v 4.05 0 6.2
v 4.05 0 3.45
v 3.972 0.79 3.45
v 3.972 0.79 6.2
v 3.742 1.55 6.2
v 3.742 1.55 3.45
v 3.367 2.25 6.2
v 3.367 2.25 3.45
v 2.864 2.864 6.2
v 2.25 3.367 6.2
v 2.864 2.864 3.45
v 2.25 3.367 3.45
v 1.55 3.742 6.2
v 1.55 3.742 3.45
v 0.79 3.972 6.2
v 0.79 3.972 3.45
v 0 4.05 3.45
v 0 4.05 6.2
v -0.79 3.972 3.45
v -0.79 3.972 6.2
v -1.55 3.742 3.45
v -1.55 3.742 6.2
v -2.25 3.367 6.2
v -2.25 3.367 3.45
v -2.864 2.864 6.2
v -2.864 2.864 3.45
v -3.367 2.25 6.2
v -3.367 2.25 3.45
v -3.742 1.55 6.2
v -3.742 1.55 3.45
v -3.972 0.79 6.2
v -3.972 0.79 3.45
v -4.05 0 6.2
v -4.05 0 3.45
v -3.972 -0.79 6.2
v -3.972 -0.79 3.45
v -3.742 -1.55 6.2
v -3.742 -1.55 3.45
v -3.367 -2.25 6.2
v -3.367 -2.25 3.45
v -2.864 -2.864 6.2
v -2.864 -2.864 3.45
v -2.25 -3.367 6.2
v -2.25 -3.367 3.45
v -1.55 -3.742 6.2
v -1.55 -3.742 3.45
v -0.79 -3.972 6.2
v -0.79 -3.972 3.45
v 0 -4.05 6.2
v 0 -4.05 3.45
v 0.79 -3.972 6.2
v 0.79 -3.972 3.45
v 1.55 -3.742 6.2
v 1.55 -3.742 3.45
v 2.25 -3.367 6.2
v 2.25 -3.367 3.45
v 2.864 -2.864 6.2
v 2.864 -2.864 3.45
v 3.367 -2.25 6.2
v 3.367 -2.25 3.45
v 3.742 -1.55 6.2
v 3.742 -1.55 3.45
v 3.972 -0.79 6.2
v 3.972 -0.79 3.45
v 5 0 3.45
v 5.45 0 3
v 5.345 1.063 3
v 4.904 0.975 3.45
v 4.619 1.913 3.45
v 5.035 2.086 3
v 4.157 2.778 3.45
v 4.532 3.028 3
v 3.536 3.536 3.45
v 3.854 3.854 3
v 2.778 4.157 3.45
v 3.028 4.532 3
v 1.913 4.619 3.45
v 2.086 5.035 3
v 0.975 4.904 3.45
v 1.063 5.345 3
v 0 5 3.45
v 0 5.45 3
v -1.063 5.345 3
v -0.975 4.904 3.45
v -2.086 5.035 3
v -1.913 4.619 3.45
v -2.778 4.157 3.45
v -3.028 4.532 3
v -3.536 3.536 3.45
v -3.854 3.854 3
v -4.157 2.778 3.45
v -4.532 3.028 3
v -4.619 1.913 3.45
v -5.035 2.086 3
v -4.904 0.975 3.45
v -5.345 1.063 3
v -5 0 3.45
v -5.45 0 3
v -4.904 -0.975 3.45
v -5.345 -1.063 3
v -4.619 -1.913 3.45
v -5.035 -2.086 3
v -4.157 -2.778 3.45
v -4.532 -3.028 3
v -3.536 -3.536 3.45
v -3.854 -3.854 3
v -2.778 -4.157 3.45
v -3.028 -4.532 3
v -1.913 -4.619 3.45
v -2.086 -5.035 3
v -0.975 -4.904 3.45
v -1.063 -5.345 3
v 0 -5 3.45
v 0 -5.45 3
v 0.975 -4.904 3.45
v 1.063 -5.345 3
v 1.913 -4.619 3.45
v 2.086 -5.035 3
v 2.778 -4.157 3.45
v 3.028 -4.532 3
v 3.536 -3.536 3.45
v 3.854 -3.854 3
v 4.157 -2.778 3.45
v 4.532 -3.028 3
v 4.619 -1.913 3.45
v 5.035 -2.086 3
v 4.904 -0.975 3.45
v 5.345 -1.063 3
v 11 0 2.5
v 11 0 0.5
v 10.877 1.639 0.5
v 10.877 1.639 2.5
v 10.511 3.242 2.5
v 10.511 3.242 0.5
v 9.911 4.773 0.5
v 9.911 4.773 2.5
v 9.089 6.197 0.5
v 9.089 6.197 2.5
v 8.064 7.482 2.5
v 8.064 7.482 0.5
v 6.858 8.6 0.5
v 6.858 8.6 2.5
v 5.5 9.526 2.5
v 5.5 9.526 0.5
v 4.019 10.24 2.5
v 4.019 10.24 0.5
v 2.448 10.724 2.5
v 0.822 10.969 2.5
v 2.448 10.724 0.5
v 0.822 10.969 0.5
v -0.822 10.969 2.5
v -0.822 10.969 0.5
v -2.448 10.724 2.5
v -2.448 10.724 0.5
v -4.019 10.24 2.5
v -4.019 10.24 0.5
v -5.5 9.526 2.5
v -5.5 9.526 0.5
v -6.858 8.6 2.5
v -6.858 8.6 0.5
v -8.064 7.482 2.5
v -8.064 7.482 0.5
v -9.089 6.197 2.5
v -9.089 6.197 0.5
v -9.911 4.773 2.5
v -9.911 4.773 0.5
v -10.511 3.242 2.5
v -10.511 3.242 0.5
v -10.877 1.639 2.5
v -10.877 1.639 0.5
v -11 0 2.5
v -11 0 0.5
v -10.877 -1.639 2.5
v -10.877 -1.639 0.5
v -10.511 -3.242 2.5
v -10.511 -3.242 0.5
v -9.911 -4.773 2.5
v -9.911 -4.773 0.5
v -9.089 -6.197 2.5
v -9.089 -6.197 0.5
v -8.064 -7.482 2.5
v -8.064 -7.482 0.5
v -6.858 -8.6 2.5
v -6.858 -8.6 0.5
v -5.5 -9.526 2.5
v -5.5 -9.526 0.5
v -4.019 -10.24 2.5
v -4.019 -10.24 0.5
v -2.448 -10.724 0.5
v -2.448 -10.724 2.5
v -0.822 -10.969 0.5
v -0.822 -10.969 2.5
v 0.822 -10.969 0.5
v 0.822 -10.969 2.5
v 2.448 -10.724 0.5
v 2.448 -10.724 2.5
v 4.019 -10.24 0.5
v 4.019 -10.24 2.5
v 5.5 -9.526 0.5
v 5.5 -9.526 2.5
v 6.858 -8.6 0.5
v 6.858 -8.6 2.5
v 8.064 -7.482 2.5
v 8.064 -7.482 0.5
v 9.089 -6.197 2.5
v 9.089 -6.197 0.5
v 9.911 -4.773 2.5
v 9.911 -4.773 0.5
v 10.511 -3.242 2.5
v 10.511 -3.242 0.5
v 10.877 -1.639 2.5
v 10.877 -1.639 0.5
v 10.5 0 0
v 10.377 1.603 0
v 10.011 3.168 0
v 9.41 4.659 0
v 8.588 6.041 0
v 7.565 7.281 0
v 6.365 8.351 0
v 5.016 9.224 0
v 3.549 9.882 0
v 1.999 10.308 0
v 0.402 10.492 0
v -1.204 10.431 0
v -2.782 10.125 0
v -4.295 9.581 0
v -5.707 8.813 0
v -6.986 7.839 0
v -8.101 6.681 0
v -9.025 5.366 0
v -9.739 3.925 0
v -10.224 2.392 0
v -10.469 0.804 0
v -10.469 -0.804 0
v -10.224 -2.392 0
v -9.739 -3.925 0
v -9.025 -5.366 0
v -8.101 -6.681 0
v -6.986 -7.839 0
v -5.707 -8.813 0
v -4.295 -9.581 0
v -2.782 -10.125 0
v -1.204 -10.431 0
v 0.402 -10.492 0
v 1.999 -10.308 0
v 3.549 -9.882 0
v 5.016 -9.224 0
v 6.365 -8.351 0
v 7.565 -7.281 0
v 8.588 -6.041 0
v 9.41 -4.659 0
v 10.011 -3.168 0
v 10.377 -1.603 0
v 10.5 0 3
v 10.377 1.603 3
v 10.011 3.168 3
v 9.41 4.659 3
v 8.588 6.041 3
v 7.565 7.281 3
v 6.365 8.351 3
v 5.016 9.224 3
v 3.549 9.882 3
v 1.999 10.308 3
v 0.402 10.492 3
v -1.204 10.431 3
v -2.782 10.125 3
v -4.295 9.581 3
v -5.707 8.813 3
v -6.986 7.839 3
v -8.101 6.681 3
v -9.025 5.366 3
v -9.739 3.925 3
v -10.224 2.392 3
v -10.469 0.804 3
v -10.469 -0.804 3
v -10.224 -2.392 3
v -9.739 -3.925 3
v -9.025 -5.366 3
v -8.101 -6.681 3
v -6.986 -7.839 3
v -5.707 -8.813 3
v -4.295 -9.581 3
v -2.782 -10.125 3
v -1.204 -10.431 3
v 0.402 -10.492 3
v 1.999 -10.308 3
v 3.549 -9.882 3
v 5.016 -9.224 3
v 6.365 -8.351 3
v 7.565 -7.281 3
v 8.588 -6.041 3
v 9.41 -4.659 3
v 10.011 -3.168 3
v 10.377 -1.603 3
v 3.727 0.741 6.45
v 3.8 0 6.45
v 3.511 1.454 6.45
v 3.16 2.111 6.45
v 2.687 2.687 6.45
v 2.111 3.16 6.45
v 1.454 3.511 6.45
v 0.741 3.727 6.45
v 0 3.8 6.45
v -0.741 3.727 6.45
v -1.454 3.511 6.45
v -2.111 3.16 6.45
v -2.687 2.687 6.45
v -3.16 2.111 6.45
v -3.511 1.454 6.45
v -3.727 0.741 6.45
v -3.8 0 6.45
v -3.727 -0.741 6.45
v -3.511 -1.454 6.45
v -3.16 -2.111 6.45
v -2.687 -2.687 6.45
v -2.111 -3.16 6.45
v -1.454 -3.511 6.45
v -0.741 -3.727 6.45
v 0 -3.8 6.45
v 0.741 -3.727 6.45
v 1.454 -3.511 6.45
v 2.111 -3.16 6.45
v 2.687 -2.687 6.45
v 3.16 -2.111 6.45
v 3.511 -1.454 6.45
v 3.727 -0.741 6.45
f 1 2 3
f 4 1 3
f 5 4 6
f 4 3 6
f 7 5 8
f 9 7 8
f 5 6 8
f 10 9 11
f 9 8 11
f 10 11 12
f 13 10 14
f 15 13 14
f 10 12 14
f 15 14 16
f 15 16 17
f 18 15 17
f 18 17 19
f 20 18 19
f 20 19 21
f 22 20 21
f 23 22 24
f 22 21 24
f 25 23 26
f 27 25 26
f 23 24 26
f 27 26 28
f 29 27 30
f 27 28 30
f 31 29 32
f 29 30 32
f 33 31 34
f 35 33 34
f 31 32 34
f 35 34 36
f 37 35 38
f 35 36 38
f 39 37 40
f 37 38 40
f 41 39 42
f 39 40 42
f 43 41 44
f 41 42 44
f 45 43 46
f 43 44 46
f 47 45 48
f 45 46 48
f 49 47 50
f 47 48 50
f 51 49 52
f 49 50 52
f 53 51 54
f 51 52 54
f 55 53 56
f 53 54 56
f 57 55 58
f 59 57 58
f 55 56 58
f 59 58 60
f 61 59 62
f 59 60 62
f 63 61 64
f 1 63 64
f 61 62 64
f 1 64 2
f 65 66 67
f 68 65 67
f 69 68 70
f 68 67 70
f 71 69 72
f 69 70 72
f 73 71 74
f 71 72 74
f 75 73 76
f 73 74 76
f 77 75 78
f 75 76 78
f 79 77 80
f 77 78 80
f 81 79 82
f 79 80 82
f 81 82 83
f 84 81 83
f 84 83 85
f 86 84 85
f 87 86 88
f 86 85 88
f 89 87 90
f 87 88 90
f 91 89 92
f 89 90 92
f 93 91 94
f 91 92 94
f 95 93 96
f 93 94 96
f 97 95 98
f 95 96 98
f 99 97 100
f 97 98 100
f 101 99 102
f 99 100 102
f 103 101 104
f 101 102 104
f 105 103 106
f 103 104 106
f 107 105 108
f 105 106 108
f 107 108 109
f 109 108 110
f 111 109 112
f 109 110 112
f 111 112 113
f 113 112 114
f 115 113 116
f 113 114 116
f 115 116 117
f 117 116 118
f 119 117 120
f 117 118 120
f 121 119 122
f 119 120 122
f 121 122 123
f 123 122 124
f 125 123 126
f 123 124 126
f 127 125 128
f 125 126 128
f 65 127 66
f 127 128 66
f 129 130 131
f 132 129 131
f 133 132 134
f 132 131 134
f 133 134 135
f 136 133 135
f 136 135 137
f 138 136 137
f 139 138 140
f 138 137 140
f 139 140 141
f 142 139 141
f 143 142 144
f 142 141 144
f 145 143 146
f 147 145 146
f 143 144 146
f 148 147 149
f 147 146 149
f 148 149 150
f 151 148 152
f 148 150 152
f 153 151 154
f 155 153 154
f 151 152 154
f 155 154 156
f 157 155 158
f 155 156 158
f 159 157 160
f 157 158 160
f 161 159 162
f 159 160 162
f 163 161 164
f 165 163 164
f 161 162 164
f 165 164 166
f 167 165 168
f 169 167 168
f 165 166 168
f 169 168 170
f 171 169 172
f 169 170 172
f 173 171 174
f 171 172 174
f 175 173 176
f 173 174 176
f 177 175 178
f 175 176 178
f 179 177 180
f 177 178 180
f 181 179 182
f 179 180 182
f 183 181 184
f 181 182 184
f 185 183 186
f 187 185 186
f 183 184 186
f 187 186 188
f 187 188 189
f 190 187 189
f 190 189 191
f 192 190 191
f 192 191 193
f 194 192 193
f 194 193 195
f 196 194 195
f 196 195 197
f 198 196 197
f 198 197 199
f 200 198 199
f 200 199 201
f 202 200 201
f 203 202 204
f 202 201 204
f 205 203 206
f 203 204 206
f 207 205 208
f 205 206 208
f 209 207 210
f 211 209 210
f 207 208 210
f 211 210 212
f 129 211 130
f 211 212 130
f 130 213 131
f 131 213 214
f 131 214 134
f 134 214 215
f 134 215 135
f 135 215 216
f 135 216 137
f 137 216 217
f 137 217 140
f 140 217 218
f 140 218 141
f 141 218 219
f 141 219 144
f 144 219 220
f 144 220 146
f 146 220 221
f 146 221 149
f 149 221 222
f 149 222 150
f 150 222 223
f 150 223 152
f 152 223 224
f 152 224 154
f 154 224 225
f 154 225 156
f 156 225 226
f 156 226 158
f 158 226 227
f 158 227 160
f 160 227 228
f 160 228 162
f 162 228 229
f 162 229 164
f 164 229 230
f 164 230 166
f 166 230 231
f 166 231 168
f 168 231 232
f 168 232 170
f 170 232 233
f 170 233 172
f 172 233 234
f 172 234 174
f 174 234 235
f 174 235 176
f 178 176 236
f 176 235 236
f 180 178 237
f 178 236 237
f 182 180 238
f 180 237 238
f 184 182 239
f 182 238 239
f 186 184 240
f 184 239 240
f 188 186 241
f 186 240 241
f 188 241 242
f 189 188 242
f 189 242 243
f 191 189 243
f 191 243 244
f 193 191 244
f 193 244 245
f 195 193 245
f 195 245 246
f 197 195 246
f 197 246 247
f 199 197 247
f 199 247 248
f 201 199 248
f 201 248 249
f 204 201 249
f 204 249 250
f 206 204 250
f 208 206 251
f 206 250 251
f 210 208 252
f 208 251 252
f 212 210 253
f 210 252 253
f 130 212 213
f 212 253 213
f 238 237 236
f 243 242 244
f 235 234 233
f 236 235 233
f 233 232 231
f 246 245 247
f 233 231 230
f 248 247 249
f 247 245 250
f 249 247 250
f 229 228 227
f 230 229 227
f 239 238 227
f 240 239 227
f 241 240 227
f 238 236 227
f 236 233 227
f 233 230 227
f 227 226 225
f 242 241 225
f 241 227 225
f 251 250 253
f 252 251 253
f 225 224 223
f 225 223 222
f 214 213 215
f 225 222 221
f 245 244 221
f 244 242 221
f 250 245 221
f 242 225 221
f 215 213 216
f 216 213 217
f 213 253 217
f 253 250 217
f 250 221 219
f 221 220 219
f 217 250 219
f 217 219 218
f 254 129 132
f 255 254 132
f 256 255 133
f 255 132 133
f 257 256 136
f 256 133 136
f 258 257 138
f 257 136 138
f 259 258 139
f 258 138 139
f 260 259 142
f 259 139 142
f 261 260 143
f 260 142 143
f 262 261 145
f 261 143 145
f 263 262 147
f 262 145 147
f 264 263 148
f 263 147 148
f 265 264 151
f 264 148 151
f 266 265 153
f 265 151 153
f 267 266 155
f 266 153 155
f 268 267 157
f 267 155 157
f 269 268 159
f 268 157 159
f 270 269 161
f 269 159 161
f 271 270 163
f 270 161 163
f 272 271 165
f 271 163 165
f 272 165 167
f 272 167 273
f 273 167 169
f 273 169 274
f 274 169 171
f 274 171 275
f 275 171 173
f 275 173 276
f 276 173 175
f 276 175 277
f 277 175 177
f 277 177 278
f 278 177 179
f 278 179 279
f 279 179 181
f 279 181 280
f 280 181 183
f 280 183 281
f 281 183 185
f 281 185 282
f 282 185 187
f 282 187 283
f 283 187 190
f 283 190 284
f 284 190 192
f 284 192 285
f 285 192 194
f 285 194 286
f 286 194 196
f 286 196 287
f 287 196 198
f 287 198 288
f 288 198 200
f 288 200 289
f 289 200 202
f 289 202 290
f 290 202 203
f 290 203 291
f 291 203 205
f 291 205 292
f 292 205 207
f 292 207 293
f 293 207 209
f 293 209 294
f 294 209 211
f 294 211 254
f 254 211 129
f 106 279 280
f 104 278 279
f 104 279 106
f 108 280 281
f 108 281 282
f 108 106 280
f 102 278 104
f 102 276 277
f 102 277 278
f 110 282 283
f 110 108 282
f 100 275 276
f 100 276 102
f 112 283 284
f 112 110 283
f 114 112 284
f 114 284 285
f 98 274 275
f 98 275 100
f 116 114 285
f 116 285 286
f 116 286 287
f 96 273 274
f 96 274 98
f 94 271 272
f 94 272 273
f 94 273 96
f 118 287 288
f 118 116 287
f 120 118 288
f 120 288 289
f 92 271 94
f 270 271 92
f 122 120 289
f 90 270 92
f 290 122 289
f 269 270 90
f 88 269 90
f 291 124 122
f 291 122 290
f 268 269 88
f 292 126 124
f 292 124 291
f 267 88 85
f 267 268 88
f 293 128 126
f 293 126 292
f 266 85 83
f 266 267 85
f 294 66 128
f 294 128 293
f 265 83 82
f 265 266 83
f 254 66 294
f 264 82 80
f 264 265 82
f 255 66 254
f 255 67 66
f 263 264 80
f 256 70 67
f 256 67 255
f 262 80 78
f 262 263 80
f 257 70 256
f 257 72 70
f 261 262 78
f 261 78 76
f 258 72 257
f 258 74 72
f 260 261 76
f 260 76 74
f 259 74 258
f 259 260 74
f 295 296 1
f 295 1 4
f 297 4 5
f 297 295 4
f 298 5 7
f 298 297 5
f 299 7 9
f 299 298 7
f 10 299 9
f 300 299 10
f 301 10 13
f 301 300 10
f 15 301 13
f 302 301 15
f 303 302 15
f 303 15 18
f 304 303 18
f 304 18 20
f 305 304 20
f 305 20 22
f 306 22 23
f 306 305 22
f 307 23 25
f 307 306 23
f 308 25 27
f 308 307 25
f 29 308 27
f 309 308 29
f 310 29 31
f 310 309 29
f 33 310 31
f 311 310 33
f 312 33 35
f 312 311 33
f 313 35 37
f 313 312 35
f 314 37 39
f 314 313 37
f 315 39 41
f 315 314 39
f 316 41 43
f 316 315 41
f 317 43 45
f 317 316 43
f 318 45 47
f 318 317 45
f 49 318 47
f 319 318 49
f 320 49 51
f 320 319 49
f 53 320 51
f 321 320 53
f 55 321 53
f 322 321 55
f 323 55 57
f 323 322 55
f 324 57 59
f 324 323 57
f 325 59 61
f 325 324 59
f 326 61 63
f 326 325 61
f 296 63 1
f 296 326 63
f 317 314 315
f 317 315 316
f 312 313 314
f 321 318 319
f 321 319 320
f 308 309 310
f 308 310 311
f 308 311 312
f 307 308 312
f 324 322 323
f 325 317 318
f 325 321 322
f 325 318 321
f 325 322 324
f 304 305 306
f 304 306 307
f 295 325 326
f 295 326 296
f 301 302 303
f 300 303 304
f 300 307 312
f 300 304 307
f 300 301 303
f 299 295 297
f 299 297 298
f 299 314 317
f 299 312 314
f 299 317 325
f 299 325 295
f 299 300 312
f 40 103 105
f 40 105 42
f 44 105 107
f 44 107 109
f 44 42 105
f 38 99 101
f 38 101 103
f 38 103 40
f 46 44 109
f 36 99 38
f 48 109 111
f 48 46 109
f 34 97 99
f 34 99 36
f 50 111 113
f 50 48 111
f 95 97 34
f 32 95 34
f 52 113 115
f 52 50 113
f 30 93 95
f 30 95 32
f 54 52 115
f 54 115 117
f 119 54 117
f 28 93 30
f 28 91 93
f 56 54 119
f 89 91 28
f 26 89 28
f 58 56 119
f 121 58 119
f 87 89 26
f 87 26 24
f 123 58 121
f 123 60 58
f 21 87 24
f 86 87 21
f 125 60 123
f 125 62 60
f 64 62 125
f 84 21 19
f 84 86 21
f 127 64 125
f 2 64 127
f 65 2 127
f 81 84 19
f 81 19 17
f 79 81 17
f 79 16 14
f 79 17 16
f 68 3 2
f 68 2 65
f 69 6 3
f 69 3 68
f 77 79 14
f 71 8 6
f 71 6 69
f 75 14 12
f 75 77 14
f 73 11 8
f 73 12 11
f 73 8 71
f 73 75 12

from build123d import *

# Parameters (mm, degrees)
F0_R     = 11
F1_DEPTH = 3
F2_R     = 5.5
F3_DEPTH = 0.45
F4_R     = 4.05
F5_DEPTH = 3
F6_SIZE  = 0.25
F8_SIZE  = 0.5


# Not quite as in the source:
# - a fillet or chamfer that OpenCascade refuses, or shapes differently, is made with other operations: its cross-section is extruded or revolved along the edge and cut away or added


with BuildPart() as f1:
    # F0 (on Top) → F1 (new body)
    with BuildSketch(Plane.XY):
        Circle(F0_R)
    extrude(amount=F1_DEPTH)

    # F2 (on face) → F3 (join)
    with BuildSketch(Plane.XY.offset(3)):
        Circle(F2_R)
    extrude(amount=F3_DEPTH)

    # F4 (on face) → F5 (join)
    with BuildSketch(Plane.XY.offset(3.45)):
        Circle(F4_R)
    extrude(amount=F5_DEPTH)

    # F6
    f6_edges = [f1.edges().sort_by_distance(p)[0] for p in [
        (-4.05, 0, 6.45),
    ]]
    chamfer(f6_edges, length=F6_SIZE)

    # F7: chamfer of 0.5 on 1 edges, made by hand


with BuildPart() as f7_tool2:
    # F7_s3 → F7_t4 (revolve)
    with BuildSketch(Plane.XZ):
        Polygon((5, 3.45), (5.5, 2.95), (5.5, 3.45), align=None)
    revolve(axis=Axis((0, 0, 3.45), (0, 0, 1)))

    split(bisect_by=Plane.XY.offset(3), keep=Keep.TOP)


with BuildPart() as f1_1:
    add(f1.part)

    # F7_t1: cut F7_tool2
    add(f7_tool2.part, mode=Mode.SUBTRACT)

    # F8
    f8_edges = [f1_1.edges().sort_by_distance(p)[0] for p in [
        (-11, 0, 0),
        (-11, 0, 3),
    ]]
    chamfer(f8_edges, length=F8_SIZE)


solid = f1_1.part
